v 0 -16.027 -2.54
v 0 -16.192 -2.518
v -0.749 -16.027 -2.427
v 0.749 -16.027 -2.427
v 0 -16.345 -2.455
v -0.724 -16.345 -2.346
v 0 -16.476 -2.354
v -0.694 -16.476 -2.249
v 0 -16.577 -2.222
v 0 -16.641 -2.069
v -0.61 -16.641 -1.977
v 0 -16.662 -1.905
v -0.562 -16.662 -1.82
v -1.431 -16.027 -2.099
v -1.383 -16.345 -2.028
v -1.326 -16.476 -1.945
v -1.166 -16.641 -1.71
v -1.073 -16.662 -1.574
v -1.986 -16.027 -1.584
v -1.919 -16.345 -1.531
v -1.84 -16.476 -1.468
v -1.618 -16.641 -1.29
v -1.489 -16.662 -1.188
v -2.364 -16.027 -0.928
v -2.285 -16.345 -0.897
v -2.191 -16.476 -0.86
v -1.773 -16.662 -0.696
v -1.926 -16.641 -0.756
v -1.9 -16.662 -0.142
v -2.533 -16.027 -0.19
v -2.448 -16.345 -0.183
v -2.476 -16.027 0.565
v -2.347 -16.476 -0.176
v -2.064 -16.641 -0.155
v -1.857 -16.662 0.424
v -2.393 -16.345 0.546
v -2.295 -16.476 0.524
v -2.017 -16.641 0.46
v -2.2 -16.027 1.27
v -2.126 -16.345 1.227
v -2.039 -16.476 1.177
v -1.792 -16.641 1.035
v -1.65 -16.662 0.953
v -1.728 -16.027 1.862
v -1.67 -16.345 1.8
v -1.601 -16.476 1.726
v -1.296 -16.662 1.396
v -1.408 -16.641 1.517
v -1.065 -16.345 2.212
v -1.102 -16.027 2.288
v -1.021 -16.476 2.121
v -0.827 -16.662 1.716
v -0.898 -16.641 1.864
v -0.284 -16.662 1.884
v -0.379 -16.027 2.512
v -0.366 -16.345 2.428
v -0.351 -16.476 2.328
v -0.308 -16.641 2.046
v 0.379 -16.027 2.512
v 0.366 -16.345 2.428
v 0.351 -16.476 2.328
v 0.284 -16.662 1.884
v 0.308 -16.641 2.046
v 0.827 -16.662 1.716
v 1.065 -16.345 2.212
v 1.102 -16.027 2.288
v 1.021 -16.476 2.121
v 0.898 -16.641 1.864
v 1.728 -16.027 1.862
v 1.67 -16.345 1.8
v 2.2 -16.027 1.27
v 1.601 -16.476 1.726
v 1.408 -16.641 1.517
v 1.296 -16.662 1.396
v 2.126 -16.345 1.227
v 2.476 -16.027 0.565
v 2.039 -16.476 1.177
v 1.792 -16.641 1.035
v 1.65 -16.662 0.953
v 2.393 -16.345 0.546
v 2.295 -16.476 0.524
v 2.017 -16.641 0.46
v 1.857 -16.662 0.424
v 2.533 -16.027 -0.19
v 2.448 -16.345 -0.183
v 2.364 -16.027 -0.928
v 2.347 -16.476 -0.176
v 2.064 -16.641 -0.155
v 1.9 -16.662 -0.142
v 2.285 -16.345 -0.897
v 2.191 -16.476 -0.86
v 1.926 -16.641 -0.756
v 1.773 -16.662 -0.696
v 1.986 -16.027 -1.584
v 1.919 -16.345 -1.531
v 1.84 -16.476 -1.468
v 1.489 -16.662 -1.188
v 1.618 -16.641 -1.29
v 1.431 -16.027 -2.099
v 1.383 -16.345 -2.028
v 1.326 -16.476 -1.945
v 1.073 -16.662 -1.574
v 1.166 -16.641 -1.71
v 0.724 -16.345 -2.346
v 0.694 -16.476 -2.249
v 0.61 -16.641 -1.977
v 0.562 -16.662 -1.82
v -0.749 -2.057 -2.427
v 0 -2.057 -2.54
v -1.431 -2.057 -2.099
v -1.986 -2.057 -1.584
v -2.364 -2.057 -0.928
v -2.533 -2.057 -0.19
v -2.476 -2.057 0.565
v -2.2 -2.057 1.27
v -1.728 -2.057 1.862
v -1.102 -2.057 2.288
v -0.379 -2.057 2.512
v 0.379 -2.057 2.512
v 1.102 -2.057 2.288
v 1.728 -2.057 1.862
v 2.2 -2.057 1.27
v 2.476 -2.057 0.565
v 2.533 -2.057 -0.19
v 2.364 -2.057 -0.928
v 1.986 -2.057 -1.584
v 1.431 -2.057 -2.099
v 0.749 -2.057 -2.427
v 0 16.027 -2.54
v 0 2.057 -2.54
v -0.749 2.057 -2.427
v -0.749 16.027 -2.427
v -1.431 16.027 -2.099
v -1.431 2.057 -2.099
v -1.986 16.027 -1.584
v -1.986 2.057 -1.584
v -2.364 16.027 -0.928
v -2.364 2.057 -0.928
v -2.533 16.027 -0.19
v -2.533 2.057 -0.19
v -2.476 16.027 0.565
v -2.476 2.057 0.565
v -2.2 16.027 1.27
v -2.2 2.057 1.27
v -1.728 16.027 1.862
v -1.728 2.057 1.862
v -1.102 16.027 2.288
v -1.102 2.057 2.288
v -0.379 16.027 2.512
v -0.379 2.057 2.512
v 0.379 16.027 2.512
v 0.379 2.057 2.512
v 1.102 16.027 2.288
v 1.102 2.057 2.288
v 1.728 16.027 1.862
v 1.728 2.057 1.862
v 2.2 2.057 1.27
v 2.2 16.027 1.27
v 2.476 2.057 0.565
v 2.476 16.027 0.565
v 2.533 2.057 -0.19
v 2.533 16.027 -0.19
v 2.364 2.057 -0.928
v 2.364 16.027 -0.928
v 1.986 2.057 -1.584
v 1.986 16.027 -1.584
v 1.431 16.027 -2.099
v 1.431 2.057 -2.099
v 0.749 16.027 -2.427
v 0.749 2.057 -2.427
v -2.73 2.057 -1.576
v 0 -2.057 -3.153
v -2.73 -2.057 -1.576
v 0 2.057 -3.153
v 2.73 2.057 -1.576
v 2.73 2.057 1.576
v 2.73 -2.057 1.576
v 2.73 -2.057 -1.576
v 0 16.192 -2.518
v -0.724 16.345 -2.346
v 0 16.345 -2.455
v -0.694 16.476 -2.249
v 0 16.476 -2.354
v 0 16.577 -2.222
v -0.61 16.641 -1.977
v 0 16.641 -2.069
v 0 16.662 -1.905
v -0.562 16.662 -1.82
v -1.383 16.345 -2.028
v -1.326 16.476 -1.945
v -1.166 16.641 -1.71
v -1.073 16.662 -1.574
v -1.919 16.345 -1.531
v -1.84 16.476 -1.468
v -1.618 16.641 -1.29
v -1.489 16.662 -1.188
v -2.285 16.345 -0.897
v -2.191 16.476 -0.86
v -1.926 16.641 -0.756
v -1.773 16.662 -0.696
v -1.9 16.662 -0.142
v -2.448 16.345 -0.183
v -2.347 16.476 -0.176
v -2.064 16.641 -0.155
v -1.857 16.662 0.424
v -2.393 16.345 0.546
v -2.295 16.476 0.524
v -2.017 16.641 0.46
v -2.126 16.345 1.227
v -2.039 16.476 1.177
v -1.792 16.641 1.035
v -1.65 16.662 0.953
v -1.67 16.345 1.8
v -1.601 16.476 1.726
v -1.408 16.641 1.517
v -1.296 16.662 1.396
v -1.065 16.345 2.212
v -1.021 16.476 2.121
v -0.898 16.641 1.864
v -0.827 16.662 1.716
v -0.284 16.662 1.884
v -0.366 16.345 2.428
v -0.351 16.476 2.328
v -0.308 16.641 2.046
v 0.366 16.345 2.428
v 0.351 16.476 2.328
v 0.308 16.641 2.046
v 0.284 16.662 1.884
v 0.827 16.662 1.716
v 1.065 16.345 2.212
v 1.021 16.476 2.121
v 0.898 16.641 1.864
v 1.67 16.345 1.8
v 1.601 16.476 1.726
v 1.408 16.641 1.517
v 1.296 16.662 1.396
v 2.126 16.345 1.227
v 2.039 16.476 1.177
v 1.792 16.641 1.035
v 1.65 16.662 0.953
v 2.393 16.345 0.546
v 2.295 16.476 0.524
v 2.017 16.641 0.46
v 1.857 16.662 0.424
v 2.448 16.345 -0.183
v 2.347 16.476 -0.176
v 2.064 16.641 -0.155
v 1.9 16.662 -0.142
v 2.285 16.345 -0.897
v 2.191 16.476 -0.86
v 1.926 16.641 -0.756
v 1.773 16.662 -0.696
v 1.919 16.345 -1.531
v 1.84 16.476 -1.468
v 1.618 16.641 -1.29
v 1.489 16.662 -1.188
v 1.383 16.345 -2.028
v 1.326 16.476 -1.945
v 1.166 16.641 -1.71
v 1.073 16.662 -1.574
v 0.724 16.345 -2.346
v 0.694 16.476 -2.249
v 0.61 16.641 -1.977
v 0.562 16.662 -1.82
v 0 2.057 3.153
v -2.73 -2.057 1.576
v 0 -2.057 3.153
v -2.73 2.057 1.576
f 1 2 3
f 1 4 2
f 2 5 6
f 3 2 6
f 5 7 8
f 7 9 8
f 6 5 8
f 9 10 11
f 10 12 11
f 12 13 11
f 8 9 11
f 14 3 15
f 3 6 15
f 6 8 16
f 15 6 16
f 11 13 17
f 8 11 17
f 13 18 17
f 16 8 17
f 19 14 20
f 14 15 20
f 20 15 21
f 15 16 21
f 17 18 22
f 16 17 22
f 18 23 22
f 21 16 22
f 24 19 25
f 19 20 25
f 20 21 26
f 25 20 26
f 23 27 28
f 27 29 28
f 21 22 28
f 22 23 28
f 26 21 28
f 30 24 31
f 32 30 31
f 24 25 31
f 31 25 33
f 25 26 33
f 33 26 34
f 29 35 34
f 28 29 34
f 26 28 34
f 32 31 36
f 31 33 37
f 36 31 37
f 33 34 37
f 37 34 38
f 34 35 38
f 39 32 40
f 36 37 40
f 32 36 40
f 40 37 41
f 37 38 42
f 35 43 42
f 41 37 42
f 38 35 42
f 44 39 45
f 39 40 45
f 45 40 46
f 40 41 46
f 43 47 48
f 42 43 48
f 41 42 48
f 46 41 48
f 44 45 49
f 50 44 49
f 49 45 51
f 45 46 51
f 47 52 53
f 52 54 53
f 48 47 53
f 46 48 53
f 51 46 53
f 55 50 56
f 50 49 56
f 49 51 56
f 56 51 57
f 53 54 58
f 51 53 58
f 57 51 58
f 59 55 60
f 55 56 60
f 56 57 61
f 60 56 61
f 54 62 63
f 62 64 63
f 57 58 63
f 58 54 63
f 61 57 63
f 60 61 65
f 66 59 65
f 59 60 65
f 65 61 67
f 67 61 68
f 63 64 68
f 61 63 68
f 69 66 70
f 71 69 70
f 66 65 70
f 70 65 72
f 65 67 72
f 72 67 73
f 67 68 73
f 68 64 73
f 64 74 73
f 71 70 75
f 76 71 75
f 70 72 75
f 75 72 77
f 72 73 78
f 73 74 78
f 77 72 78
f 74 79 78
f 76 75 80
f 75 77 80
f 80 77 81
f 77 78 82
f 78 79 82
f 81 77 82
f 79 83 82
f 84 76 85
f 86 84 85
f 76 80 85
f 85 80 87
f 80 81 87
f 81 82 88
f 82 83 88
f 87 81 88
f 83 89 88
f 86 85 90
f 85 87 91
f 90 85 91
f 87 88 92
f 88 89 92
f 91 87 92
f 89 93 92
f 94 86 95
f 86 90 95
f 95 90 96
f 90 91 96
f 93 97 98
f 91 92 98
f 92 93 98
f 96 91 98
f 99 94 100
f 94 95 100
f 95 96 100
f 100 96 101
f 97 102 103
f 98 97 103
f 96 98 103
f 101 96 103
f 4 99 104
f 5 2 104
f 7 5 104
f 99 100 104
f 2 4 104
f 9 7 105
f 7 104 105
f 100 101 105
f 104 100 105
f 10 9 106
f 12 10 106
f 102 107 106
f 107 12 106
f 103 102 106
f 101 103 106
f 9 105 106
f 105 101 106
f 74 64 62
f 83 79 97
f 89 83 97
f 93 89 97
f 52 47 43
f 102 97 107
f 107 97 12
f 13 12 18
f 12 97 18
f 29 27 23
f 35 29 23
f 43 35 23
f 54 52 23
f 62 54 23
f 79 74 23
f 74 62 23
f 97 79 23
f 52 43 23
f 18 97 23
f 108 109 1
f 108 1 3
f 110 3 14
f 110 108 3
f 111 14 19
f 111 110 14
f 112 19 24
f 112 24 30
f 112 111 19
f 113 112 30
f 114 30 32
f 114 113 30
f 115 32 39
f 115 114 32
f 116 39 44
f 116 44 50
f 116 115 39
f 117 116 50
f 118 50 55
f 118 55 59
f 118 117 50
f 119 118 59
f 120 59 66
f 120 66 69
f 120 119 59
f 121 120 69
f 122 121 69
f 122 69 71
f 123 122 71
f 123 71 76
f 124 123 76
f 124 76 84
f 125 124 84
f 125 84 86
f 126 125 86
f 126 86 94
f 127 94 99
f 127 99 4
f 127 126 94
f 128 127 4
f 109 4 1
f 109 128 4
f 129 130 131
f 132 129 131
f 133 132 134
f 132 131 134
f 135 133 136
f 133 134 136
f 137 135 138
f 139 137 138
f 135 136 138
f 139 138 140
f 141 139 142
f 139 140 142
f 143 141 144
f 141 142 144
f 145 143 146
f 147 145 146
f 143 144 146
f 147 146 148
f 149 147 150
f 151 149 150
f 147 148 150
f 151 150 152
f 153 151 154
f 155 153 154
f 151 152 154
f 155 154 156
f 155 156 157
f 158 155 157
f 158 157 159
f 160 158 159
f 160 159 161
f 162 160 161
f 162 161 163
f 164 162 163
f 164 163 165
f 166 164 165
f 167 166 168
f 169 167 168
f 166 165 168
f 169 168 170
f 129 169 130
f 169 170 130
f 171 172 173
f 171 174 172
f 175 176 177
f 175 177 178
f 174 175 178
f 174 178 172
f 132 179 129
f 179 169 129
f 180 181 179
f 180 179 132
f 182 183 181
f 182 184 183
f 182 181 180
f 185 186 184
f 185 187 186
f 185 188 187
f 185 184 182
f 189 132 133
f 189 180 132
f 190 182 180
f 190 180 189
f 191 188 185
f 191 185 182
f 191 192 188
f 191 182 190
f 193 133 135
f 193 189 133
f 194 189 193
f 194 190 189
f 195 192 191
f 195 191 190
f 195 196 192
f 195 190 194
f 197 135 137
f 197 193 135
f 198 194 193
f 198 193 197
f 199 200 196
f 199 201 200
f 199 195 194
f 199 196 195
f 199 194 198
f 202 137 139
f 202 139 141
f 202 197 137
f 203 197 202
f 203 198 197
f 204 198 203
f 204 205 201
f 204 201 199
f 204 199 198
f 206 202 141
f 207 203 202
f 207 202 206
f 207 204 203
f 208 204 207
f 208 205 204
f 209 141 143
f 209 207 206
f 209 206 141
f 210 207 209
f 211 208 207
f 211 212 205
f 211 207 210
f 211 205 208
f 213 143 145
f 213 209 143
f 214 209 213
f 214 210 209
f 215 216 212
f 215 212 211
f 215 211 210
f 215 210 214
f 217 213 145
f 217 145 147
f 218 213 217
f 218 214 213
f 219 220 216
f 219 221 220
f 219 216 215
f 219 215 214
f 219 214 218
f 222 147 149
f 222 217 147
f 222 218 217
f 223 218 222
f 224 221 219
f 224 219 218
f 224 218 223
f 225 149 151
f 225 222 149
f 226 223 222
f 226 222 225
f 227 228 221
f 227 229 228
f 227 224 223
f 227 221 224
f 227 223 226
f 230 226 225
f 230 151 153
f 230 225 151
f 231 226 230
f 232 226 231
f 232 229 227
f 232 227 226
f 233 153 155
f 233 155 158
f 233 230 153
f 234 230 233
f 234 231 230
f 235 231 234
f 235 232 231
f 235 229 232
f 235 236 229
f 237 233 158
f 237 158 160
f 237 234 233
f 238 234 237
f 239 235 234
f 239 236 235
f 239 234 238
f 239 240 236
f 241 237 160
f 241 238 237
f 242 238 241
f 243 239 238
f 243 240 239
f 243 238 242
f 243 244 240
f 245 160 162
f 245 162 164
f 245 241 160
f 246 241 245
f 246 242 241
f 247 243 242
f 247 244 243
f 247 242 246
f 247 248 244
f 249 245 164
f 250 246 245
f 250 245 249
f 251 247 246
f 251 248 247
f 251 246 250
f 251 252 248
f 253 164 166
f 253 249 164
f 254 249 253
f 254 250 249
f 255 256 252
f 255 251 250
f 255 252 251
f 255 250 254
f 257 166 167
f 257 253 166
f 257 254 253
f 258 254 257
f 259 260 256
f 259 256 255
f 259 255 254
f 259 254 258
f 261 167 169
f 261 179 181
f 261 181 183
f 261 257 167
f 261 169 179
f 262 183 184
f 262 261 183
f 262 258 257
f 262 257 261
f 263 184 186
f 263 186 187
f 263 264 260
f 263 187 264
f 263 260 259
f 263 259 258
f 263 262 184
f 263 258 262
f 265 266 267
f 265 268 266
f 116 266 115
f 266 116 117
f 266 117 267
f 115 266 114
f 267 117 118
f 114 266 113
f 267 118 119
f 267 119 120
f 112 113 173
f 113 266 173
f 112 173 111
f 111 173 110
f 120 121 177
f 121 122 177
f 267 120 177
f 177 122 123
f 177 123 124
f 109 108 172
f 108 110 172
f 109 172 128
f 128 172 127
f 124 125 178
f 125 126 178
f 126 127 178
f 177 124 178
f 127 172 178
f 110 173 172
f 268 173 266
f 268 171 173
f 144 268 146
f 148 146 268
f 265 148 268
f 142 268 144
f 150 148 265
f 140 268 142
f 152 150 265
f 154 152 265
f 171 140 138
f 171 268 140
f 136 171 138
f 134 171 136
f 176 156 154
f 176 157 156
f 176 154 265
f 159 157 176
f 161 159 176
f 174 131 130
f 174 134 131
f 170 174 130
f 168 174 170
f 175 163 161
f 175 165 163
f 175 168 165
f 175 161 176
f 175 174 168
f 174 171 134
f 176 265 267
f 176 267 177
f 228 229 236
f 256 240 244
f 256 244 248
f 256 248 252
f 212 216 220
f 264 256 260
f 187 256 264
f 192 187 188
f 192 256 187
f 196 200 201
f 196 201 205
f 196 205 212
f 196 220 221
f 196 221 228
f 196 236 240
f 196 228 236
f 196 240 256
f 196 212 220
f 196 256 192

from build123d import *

# Parameters (mm, degrees)
BOSS_EXTRUDE1_DEPTH = 2.0574
SKETCH2_R           = 2.54
BOSS_EXTRUDE2_DEPTH = 14.605
FILLET1_R           = 0.635


with BuildPart() as part:
    # Sketch1 → Boss-Extrude1 (new, symmetric)
    with BuildSketch(Plane(origin=(0, 0, 0), x_dir=(1, 0, 0), z_dir=(0, 1, 0))):
        Polygon((-2.7305, -1.57645491), (0, -3.15290982), (2.7305, -1.57645491), (2.7305, 1.57645491), (0, 3.15290982), (-2.7305, 1.57645491), align=None)
    extrude(amount=BOSS_EXTRUDE1_DEPTH, both=True)

    # Sketch2 → Boss-Extrude2 (add)
    with BuildSketch(Plane(origin=(0, 2.0574, 0), x_dir=(1, 0, 0), z_dir=(0, 1, 0))):
        with Locations(Location((0, 0, 0), (0, 0, 90))):
            Circle(SKETCH2_R)
    boss_extrude2 = extrude(amount=BOSS_EXTRUDE2_DEPTH)

    # Mirror1: Boss-Extrude2 across plane
    add(boss_extrude2.mirror(Plane.ZX))

    # Fillet1
    fillet1_edges = [part.edges().sort_by_distance(p)[0] for p in [
        (0, 16.6624, 2.54),
        (0, -16.6624, 2.54),
    ]]
    fillet(fillet1_edges, radius=FILLET1_R)


solid = part.part
